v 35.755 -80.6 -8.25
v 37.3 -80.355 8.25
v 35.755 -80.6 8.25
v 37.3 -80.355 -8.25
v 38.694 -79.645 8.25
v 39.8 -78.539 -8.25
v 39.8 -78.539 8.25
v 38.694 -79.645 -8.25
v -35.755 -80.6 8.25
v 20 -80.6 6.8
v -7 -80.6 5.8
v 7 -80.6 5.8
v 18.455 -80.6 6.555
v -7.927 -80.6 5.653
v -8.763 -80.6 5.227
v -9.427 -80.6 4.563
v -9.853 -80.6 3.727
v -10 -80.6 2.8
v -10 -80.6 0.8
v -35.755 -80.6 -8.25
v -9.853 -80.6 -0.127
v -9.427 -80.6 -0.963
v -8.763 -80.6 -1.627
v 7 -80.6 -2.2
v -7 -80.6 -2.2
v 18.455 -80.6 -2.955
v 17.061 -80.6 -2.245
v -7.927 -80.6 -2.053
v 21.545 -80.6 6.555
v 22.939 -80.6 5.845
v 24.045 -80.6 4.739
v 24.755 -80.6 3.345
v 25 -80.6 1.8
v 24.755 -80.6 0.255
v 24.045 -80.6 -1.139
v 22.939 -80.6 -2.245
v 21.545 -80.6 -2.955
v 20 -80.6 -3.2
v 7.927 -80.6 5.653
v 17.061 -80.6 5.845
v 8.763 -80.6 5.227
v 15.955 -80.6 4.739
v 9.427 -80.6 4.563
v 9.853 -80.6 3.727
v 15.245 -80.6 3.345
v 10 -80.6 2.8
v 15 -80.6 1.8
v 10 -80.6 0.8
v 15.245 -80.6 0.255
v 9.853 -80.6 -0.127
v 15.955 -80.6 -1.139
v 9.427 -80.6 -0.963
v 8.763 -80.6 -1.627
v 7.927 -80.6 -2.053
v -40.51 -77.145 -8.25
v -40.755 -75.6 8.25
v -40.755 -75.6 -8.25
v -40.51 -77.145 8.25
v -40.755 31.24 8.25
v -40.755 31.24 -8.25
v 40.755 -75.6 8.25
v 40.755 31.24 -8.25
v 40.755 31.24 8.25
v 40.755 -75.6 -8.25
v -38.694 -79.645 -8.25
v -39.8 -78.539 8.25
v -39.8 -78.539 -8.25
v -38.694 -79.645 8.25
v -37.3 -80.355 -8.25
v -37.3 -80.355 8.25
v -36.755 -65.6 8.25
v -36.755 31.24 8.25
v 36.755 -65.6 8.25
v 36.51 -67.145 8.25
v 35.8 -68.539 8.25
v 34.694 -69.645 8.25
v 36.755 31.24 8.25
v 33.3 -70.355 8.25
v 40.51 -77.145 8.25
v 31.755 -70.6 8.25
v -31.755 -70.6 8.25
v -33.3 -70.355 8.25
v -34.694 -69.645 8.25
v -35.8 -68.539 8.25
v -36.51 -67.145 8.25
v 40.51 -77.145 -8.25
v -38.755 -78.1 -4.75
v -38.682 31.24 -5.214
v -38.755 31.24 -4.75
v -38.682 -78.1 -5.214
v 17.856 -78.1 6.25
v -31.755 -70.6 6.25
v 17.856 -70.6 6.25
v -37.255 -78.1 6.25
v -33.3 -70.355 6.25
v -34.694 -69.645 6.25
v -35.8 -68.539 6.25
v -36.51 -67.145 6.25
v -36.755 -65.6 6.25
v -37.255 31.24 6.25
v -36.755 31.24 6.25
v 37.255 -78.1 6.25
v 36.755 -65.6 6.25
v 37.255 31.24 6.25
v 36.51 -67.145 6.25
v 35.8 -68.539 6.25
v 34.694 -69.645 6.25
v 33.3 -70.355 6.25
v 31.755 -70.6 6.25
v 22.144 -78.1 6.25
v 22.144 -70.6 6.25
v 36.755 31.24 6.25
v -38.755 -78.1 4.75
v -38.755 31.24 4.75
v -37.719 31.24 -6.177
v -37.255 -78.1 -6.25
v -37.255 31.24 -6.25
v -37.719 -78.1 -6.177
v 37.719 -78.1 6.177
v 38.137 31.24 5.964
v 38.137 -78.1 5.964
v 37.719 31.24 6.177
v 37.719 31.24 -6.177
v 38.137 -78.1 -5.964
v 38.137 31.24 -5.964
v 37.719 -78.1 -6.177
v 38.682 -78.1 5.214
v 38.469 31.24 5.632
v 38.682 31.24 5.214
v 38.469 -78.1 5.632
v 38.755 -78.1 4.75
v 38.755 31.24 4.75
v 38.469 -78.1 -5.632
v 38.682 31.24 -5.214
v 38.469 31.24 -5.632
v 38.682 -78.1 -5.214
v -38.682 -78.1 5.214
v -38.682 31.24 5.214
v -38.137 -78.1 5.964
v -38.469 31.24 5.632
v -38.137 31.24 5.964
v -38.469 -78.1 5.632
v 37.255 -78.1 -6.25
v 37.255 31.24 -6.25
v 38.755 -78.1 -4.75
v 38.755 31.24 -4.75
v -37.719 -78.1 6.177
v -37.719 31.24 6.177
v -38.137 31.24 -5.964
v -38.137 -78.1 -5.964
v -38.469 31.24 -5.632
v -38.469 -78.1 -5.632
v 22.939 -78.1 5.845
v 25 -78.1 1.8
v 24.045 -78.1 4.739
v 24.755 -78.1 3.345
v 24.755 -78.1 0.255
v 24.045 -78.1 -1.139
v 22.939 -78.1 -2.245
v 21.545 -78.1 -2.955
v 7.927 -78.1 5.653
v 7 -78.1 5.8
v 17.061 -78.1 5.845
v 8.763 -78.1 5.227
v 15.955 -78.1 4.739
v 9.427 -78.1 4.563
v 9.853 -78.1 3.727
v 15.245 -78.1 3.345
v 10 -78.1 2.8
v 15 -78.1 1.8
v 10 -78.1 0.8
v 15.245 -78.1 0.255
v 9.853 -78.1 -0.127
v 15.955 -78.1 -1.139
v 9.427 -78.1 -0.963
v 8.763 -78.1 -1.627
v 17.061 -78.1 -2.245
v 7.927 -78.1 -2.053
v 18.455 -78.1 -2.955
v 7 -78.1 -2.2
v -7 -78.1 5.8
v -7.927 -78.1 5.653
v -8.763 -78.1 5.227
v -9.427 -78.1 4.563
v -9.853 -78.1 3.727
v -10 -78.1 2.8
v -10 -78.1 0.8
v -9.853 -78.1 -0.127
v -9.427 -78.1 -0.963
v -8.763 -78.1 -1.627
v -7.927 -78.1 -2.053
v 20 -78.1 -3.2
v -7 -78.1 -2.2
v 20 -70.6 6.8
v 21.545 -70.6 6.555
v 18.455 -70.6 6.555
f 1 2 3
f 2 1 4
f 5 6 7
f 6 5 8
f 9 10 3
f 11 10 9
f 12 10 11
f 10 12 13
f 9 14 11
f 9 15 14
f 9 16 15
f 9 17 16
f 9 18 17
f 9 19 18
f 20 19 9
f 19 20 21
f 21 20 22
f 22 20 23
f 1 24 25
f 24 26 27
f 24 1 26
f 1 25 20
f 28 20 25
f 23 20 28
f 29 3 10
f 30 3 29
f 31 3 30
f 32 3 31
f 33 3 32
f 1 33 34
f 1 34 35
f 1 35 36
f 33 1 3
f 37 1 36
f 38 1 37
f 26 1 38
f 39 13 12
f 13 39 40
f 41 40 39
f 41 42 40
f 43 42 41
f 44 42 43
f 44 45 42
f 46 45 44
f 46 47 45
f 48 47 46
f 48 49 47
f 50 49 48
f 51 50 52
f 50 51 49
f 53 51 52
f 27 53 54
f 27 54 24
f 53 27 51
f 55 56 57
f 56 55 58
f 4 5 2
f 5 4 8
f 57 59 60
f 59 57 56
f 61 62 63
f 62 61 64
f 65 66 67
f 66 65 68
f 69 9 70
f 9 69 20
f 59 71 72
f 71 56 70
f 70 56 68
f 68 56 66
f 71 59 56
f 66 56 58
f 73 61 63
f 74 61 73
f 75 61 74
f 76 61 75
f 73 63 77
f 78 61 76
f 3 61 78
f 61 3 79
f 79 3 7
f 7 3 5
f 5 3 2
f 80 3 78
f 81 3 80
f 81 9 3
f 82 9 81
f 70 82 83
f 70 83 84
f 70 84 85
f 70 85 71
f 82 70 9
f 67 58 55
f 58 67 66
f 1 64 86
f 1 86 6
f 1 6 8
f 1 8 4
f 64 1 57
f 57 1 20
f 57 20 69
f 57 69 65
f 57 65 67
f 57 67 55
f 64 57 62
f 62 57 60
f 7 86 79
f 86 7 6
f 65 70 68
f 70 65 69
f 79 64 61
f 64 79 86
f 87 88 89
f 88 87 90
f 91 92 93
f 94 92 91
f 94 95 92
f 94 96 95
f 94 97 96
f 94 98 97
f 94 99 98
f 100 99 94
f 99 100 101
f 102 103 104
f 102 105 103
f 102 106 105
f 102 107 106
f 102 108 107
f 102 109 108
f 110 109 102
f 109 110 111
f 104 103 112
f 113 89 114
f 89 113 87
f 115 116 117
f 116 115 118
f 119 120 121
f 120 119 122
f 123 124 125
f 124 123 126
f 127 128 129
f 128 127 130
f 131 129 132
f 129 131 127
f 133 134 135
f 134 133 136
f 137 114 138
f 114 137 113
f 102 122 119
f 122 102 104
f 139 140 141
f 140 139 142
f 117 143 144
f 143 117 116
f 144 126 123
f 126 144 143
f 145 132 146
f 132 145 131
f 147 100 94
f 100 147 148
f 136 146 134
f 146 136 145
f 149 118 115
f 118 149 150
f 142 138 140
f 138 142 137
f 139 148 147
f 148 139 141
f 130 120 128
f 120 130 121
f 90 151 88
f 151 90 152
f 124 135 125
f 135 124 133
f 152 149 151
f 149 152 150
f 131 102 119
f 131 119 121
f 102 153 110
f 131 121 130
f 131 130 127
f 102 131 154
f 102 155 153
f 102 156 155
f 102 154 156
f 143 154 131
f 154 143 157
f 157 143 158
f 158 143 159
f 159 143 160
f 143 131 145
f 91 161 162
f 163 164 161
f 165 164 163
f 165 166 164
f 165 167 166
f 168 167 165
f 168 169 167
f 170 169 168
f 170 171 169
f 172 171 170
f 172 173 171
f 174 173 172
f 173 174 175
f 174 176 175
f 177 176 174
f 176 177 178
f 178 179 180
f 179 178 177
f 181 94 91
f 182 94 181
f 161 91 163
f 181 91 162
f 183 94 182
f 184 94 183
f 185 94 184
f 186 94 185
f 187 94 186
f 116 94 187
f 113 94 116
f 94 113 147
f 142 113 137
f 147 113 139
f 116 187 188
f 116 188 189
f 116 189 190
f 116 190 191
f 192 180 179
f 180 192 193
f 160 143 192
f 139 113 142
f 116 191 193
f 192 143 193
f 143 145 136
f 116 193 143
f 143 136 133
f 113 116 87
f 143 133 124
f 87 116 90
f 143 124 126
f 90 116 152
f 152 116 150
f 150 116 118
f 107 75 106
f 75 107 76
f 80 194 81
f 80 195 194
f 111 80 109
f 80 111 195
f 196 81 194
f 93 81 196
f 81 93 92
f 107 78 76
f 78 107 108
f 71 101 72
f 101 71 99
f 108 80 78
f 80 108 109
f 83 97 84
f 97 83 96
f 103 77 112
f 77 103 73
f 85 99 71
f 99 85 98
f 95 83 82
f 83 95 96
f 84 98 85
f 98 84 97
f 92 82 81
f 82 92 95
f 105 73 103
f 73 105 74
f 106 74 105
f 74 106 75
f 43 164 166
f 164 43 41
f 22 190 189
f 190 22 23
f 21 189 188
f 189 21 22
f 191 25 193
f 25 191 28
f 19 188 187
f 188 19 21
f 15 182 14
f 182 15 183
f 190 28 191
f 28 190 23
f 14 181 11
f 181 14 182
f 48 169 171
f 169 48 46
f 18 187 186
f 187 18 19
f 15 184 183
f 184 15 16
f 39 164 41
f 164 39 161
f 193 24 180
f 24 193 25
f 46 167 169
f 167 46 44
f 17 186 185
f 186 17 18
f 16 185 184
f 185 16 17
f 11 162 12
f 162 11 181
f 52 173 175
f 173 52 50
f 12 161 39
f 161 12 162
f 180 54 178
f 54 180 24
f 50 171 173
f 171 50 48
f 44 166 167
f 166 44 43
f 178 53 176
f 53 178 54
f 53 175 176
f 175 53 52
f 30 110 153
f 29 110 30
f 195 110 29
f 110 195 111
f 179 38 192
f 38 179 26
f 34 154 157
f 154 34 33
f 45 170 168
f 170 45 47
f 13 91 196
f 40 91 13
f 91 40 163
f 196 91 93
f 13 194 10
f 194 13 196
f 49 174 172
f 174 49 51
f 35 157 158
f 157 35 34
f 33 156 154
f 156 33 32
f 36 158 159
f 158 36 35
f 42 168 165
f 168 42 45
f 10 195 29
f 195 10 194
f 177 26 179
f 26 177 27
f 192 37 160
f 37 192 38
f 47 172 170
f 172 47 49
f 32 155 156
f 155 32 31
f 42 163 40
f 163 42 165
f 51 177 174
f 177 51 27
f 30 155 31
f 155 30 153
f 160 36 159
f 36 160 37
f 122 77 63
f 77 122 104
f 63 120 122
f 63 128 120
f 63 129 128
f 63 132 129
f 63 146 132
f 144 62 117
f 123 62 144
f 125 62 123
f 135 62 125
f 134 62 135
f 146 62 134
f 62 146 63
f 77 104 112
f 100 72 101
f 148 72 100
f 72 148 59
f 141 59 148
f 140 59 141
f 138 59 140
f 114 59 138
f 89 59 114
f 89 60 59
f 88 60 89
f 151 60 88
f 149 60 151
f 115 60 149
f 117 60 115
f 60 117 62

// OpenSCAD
//built and tested with OpenSCAD version 2018.01.06 (git 3473eb1) 
//last modified January 14th, 2018

// (phone width [default: Moto Z2 Play + Moto Turbopower battery pack mod]) :
pwidth = 76.51; 
// (phone height [default: Moto Z2 Play + Moto Turbopower battery pack mod]) :
pheight = 156.2; 
// (phone thickness [default: Moto Z2 Play + Moto Turbopower battery pack mod]) :
pthick = 11.5; 

// (usb-type C port hole height) :
uheight = 8; //
// (usb type C port hole width) :
uwidth = 20; //
// (usb type C z-offset due to Moto Turbopower battery pack mod) :
uzoffset = 1.8; //
// (radius of type C port hole) :
urad = 3; //

// (center-to-center x-offset of usb type-c port and audio jack port) :
uaxoffset = 20; 
azoffset = uzoffset; //audio jack z-offset due to Moto Turbopower battery pack mod
// (radius of audio jack port, set to zero to eliminate) :
arad = 5; 
// (subtraction thickness, do not change) :
athick = 40; //subtraction thickness

// (padding, used to create thickness of external case relative to phone dimensions) :
pad = 4; //
// (radii of large corners) :
crad = 5; //
// (internal radii) :
irad = 1.5; //
// (tolerance to help fit of phone) :
tol = 1; //
// (width of brim that holds phone inside at the edges/bottom of screen) :
brim = 1.5; //

// (number of iterations for curved edges, lower for faster render time) :
fnsphere = 20; //

difference() {
    difference() {
        difference() {
            difference() {
                difference() {    
                    //EXTERNAL SHAPE
                    linear_extrude(height = pthick + pad + tol, center = true) {
                        offset(r=crad, $fn=fnsphere) {
                            square([pwidth + pad - 2*crad + tol,pheight + pad - 2*crad + tol], center = true);
                        }
                    }
                    //CUTOUT FOR PHONE
                    translate([0,pad/2,0]) rotate(a=[90,90,0]) linear_extrude(height = pheight+pad, center = true) {
                        offset(r=irad, $fn=fnsphere) {
                             square([pthick + tol - 2*irad,pwidth + tol - 2*irad], center = true);
                        }
                    }
                }
                //CUTOUT FOR SCREEN
                translate([0,4*brim,2*pad]) linear_extrude(height = pthick + 2*pad + brim, center = true) {
                    offset(r=crad, $fn=fnsphere) {
                         square([pwidth - 2*crad - 2*brim,pheight - 2*crad - 2*brim], center = true);
                    }
                }
            }
            //USB PORT
            translate([0,-pheight/2,uzoffset]) rotate(a=[90,90,0]) linear_extrude(height = uwidth, center = true) {
                offset(r=urad, $fn=fnsphere) {
                     square([uheight-2*urad,uwidth-2*urad], center = true);
                }
            }
        }
        //AUDIO PORT
        translate([uaxoffset,-pheight/2,azoffset]) rotate(a=[90,90,0]) linear_extrude(height = athick, center = true) {
             circle(r = arad, center = true, $fn=fnsphere);
        }
    }
    //Cut off top to make it less than full phone height
    translate([0,pheight*2*0.6,0]) cube([pwidth*2,pheight*2,pthick*2], center = true);
}
